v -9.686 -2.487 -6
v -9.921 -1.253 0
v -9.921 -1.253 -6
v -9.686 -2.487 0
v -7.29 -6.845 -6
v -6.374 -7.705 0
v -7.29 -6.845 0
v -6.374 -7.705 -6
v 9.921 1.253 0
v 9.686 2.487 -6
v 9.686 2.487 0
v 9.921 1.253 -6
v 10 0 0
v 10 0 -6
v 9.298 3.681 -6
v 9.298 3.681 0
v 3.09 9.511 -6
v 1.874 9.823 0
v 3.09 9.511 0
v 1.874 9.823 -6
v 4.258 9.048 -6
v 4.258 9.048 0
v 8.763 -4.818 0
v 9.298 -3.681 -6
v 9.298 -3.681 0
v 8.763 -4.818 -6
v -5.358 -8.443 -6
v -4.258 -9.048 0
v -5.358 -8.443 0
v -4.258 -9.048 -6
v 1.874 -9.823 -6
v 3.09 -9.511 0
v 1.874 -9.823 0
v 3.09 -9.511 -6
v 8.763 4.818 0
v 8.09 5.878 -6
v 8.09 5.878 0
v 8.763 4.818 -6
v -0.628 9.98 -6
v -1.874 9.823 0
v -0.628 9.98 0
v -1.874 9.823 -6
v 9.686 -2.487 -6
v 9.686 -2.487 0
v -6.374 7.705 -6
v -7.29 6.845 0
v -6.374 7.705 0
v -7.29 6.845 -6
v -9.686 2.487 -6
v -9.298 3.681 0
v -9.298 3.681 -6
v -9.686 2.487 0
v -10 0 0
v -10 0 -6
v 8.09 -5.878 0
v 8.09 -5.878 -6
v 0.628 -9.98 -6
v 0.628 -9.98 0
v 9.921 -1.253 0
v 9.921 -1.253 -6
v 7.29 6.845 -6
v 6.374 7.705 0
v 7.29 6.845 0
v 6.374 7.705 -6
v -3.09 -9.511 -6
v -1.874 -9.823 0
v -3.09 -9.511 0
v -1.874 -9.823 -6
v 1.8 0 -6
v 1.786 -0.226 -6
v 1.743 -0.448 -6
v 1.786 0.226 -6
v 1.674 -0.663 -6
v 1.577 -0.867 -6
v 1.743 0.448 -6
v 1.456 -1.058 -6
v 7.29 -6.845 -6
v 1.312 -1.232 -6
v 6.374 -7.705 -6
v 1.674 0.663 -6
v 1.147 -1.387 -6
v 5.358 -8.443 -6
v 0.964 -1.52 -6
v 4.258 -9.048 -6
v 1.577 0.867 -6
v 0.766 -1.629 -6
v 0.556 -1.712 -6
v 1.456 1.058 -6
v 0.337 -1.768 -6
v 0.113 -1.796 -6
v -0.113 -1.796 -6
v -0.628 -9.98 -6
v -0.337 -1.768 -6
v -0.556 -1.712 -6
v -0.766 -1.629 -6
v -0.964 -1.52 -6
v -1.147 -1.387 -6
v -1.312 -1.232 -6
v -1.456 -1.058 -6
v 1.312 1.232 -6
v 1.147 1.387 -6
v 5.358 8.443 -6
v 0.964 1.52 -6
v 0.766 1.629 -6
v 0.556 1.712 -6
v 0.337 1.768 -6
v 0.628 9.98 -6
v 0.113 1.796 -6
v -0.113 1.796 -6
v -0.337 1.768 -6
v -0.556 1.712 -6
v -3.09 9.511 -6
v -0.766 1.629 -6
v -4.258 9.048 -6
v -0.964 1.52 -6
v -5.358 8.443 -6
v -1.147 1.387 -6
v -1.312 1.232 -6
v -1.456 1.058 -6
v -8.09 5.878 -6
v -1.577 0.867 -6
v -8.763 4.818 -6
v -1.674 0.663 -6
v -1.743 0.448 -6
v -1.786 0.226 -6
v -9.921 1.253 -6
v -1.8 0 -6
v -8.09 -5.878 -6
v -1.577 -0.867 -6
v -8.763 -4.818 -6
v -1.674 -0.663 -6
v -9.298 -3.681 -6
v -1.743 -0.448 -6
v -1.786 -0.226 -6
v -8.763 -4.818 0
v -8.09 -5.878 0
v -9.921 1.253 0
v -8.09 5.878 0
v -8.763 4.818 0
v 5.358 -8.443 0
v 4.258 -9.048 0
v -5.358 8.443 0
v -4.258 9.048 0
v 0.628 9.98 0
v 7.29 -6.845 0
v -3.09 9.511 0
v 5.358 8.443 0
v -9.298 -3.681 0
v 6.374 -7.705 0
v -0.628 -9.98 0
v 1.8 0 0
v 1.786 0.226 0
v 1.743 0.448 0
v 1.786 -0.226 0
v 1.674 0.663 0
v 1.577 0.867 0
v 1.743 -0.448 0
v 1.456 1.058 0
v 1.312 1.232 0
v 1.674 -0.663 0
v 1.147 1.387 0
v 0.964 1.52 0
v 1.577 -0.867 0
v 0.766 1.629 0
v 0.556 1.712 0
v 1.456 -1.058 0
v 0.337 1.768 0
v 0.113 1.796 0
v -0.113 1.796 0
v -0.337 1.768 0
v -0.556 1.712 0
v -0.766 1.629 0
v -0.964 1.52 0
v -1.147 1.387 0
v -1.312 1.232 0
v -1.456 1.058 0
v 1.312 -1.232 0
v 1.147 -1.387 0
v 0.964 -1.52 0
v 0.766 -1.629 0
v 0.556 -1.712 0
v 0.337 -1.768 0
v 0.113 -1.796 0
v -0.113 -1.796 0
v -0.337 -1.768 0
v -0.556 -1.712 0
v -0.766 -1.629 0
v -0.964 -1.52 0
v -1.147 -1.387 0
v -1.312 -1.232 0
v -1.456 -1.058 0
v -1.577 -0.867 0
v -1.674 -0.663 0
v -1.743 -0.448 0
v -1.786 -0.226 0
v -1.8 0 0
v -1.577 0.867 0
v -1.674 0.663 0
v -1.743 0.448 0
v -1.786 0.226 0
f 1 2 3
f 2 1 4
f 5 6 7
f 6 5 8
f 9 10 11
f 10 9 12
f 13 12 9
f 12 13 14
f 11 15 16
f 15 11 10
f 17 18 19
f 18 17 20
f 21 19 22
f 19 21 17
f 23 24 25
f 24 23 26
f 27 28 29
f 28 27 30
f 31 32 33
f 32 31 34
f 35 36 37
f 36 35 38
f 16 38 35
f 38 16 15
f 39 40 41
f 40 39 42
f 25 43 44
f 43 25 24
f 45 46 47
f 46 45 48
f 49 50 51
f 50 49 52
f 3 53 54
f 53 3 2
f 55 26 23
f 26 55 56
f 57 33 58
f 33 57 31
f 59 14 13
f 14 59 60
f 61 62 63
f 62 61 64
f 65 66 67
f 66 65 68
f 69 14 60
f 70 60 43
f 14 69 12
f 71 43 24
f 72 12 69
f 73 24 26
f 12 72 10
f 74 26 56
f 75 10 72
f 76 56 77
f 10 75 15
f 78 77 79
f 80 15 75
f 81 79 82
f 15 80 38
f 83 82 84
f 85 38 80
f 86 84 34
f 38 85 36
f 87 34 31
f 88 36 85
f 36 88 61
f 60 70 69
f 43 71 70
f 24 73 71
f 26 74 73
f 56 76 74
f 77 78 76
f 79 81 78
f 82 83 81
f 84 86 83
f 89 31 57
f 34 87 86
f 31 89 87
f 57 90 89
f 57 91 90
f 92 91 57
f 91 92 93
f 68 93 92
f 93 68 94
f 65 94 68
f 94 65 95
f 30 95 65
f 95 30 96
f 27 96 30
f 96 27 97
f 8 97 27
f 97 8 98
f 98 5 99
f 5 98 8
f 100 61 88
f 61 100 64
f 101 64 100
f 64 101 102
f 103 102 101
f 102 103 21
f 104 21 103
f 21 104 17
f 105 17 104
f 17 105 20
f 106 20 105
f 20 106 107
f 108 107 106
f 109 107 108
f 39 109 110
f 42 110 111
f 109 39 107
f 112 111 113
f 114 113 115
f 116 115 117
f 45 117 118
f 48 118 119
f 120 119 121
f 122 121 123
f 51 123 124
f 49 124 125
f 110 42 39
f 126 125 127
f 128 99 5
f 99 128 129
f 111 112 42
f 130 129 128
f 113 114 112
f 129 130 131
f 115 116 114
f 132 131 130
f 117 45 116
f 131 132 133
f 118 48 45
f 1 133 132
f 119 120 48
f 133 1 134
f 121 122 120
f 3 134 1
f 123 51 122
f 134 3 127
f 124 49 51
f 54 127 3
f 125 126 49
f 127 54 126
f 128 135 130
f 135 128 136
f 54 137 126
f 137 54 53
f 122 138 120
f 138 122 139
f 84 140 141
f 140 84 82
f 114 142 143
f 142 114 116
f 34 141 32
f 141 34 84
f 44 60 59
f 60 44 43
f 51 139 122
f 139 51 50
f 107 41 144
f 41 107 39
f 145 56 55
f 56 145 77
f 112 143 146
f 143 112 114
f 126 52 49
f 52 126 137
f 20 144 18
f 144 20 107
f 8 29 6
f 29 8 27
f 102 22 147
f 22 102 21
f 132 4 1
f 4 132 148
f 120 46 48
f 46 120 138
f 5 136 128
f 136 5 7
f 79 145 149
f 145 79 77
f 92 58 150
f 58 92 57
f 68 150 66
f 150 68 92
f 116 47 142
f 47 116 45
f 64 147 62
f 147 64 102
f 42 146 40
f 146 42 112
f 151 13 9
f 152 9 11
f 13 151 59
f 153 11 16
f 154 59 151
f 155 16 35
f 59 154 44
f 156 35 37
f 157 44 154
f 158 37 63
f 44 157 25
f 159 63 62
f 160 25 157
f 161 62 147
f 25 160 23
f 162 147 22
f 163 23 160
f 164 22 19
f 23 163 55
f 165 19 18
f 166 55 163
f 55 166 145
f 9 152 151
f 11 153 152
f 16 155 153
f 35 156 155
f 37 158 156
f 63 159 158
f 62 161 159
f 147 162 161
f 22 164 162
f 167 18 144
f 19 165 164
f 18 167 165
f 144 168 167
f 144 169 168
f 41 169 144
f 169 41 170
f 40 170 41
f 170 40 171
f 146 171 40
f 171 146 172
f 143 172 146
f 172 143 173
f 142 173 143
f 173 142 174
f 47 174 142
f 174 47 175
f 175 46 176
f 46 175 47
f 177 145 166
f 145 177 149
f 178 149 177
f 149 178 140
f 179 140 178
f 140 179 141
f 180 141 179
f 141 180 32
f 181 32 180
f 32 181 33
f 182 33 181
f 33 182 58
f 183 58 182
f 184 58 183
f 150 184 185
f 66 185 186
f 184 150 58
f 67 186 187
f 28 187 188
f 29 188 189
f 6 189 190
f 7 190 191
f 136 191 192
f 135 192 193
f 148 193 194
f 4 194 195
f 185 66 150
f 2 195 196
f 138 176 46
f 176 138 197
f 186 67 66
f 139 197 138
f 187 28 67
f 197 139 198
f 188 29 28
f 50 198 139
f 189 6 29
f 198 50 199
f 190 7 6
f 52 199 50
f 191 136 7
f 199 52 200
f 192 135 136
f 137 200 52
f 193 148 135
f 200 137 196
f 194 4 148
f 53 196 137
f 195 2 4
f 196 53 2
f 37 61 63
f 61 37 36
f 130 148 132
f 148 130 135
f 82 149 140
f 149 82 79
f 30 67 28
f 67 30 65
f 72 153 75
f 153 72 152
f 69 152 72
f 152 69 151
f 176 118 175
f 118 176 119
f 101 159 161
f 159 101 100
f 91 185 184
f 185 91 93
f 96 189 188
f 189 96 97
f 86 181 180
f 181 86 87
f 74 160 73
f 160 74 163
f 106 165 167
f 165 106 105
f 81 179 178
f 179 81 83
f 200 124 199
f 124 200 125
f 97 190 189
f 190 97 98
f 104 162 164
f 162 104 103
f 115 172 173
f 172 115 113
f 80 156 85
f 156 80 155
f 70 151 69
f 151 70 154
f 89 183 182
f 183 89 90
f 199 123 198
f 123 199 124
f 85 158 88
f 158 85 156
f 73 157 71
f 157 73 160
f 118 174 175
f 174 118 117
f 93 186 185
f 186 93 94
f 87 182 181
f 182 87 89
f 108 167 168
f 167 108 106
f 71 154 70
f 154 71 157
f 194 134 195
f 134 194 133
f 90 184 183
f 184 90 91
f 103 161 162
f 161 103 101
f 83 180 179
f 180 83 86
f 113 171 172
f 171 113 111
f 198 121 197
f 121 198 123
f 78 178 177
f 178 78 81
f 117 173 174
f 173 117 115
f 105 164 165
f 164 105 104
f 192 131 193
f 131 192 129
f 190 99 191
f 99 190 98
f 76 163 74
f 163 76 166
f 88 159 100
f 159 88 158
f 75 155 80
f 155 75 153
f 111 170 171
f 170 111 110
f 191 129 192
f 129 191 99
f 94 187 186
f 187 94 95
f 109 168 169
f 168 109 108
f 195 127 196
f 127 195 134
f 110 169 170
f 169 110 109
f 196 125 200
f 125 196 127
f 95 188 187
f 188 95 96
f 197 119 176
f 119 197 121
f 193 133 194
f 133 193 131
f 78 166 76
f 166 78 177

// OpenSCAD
$fn = 50;


difference() {
	union() {
		translate(v = [0, 0, -6.0000000000]) {
			cylinder(h = 6, r = 10.0000000000);
		}
		cylinder(h = 0, r = 20.0000000000);
	}
	union() {
		#translate(v = [0, 0, -6]) {
			cylinder(h = 6, r = 1.8000000000);
		}
	}
}
